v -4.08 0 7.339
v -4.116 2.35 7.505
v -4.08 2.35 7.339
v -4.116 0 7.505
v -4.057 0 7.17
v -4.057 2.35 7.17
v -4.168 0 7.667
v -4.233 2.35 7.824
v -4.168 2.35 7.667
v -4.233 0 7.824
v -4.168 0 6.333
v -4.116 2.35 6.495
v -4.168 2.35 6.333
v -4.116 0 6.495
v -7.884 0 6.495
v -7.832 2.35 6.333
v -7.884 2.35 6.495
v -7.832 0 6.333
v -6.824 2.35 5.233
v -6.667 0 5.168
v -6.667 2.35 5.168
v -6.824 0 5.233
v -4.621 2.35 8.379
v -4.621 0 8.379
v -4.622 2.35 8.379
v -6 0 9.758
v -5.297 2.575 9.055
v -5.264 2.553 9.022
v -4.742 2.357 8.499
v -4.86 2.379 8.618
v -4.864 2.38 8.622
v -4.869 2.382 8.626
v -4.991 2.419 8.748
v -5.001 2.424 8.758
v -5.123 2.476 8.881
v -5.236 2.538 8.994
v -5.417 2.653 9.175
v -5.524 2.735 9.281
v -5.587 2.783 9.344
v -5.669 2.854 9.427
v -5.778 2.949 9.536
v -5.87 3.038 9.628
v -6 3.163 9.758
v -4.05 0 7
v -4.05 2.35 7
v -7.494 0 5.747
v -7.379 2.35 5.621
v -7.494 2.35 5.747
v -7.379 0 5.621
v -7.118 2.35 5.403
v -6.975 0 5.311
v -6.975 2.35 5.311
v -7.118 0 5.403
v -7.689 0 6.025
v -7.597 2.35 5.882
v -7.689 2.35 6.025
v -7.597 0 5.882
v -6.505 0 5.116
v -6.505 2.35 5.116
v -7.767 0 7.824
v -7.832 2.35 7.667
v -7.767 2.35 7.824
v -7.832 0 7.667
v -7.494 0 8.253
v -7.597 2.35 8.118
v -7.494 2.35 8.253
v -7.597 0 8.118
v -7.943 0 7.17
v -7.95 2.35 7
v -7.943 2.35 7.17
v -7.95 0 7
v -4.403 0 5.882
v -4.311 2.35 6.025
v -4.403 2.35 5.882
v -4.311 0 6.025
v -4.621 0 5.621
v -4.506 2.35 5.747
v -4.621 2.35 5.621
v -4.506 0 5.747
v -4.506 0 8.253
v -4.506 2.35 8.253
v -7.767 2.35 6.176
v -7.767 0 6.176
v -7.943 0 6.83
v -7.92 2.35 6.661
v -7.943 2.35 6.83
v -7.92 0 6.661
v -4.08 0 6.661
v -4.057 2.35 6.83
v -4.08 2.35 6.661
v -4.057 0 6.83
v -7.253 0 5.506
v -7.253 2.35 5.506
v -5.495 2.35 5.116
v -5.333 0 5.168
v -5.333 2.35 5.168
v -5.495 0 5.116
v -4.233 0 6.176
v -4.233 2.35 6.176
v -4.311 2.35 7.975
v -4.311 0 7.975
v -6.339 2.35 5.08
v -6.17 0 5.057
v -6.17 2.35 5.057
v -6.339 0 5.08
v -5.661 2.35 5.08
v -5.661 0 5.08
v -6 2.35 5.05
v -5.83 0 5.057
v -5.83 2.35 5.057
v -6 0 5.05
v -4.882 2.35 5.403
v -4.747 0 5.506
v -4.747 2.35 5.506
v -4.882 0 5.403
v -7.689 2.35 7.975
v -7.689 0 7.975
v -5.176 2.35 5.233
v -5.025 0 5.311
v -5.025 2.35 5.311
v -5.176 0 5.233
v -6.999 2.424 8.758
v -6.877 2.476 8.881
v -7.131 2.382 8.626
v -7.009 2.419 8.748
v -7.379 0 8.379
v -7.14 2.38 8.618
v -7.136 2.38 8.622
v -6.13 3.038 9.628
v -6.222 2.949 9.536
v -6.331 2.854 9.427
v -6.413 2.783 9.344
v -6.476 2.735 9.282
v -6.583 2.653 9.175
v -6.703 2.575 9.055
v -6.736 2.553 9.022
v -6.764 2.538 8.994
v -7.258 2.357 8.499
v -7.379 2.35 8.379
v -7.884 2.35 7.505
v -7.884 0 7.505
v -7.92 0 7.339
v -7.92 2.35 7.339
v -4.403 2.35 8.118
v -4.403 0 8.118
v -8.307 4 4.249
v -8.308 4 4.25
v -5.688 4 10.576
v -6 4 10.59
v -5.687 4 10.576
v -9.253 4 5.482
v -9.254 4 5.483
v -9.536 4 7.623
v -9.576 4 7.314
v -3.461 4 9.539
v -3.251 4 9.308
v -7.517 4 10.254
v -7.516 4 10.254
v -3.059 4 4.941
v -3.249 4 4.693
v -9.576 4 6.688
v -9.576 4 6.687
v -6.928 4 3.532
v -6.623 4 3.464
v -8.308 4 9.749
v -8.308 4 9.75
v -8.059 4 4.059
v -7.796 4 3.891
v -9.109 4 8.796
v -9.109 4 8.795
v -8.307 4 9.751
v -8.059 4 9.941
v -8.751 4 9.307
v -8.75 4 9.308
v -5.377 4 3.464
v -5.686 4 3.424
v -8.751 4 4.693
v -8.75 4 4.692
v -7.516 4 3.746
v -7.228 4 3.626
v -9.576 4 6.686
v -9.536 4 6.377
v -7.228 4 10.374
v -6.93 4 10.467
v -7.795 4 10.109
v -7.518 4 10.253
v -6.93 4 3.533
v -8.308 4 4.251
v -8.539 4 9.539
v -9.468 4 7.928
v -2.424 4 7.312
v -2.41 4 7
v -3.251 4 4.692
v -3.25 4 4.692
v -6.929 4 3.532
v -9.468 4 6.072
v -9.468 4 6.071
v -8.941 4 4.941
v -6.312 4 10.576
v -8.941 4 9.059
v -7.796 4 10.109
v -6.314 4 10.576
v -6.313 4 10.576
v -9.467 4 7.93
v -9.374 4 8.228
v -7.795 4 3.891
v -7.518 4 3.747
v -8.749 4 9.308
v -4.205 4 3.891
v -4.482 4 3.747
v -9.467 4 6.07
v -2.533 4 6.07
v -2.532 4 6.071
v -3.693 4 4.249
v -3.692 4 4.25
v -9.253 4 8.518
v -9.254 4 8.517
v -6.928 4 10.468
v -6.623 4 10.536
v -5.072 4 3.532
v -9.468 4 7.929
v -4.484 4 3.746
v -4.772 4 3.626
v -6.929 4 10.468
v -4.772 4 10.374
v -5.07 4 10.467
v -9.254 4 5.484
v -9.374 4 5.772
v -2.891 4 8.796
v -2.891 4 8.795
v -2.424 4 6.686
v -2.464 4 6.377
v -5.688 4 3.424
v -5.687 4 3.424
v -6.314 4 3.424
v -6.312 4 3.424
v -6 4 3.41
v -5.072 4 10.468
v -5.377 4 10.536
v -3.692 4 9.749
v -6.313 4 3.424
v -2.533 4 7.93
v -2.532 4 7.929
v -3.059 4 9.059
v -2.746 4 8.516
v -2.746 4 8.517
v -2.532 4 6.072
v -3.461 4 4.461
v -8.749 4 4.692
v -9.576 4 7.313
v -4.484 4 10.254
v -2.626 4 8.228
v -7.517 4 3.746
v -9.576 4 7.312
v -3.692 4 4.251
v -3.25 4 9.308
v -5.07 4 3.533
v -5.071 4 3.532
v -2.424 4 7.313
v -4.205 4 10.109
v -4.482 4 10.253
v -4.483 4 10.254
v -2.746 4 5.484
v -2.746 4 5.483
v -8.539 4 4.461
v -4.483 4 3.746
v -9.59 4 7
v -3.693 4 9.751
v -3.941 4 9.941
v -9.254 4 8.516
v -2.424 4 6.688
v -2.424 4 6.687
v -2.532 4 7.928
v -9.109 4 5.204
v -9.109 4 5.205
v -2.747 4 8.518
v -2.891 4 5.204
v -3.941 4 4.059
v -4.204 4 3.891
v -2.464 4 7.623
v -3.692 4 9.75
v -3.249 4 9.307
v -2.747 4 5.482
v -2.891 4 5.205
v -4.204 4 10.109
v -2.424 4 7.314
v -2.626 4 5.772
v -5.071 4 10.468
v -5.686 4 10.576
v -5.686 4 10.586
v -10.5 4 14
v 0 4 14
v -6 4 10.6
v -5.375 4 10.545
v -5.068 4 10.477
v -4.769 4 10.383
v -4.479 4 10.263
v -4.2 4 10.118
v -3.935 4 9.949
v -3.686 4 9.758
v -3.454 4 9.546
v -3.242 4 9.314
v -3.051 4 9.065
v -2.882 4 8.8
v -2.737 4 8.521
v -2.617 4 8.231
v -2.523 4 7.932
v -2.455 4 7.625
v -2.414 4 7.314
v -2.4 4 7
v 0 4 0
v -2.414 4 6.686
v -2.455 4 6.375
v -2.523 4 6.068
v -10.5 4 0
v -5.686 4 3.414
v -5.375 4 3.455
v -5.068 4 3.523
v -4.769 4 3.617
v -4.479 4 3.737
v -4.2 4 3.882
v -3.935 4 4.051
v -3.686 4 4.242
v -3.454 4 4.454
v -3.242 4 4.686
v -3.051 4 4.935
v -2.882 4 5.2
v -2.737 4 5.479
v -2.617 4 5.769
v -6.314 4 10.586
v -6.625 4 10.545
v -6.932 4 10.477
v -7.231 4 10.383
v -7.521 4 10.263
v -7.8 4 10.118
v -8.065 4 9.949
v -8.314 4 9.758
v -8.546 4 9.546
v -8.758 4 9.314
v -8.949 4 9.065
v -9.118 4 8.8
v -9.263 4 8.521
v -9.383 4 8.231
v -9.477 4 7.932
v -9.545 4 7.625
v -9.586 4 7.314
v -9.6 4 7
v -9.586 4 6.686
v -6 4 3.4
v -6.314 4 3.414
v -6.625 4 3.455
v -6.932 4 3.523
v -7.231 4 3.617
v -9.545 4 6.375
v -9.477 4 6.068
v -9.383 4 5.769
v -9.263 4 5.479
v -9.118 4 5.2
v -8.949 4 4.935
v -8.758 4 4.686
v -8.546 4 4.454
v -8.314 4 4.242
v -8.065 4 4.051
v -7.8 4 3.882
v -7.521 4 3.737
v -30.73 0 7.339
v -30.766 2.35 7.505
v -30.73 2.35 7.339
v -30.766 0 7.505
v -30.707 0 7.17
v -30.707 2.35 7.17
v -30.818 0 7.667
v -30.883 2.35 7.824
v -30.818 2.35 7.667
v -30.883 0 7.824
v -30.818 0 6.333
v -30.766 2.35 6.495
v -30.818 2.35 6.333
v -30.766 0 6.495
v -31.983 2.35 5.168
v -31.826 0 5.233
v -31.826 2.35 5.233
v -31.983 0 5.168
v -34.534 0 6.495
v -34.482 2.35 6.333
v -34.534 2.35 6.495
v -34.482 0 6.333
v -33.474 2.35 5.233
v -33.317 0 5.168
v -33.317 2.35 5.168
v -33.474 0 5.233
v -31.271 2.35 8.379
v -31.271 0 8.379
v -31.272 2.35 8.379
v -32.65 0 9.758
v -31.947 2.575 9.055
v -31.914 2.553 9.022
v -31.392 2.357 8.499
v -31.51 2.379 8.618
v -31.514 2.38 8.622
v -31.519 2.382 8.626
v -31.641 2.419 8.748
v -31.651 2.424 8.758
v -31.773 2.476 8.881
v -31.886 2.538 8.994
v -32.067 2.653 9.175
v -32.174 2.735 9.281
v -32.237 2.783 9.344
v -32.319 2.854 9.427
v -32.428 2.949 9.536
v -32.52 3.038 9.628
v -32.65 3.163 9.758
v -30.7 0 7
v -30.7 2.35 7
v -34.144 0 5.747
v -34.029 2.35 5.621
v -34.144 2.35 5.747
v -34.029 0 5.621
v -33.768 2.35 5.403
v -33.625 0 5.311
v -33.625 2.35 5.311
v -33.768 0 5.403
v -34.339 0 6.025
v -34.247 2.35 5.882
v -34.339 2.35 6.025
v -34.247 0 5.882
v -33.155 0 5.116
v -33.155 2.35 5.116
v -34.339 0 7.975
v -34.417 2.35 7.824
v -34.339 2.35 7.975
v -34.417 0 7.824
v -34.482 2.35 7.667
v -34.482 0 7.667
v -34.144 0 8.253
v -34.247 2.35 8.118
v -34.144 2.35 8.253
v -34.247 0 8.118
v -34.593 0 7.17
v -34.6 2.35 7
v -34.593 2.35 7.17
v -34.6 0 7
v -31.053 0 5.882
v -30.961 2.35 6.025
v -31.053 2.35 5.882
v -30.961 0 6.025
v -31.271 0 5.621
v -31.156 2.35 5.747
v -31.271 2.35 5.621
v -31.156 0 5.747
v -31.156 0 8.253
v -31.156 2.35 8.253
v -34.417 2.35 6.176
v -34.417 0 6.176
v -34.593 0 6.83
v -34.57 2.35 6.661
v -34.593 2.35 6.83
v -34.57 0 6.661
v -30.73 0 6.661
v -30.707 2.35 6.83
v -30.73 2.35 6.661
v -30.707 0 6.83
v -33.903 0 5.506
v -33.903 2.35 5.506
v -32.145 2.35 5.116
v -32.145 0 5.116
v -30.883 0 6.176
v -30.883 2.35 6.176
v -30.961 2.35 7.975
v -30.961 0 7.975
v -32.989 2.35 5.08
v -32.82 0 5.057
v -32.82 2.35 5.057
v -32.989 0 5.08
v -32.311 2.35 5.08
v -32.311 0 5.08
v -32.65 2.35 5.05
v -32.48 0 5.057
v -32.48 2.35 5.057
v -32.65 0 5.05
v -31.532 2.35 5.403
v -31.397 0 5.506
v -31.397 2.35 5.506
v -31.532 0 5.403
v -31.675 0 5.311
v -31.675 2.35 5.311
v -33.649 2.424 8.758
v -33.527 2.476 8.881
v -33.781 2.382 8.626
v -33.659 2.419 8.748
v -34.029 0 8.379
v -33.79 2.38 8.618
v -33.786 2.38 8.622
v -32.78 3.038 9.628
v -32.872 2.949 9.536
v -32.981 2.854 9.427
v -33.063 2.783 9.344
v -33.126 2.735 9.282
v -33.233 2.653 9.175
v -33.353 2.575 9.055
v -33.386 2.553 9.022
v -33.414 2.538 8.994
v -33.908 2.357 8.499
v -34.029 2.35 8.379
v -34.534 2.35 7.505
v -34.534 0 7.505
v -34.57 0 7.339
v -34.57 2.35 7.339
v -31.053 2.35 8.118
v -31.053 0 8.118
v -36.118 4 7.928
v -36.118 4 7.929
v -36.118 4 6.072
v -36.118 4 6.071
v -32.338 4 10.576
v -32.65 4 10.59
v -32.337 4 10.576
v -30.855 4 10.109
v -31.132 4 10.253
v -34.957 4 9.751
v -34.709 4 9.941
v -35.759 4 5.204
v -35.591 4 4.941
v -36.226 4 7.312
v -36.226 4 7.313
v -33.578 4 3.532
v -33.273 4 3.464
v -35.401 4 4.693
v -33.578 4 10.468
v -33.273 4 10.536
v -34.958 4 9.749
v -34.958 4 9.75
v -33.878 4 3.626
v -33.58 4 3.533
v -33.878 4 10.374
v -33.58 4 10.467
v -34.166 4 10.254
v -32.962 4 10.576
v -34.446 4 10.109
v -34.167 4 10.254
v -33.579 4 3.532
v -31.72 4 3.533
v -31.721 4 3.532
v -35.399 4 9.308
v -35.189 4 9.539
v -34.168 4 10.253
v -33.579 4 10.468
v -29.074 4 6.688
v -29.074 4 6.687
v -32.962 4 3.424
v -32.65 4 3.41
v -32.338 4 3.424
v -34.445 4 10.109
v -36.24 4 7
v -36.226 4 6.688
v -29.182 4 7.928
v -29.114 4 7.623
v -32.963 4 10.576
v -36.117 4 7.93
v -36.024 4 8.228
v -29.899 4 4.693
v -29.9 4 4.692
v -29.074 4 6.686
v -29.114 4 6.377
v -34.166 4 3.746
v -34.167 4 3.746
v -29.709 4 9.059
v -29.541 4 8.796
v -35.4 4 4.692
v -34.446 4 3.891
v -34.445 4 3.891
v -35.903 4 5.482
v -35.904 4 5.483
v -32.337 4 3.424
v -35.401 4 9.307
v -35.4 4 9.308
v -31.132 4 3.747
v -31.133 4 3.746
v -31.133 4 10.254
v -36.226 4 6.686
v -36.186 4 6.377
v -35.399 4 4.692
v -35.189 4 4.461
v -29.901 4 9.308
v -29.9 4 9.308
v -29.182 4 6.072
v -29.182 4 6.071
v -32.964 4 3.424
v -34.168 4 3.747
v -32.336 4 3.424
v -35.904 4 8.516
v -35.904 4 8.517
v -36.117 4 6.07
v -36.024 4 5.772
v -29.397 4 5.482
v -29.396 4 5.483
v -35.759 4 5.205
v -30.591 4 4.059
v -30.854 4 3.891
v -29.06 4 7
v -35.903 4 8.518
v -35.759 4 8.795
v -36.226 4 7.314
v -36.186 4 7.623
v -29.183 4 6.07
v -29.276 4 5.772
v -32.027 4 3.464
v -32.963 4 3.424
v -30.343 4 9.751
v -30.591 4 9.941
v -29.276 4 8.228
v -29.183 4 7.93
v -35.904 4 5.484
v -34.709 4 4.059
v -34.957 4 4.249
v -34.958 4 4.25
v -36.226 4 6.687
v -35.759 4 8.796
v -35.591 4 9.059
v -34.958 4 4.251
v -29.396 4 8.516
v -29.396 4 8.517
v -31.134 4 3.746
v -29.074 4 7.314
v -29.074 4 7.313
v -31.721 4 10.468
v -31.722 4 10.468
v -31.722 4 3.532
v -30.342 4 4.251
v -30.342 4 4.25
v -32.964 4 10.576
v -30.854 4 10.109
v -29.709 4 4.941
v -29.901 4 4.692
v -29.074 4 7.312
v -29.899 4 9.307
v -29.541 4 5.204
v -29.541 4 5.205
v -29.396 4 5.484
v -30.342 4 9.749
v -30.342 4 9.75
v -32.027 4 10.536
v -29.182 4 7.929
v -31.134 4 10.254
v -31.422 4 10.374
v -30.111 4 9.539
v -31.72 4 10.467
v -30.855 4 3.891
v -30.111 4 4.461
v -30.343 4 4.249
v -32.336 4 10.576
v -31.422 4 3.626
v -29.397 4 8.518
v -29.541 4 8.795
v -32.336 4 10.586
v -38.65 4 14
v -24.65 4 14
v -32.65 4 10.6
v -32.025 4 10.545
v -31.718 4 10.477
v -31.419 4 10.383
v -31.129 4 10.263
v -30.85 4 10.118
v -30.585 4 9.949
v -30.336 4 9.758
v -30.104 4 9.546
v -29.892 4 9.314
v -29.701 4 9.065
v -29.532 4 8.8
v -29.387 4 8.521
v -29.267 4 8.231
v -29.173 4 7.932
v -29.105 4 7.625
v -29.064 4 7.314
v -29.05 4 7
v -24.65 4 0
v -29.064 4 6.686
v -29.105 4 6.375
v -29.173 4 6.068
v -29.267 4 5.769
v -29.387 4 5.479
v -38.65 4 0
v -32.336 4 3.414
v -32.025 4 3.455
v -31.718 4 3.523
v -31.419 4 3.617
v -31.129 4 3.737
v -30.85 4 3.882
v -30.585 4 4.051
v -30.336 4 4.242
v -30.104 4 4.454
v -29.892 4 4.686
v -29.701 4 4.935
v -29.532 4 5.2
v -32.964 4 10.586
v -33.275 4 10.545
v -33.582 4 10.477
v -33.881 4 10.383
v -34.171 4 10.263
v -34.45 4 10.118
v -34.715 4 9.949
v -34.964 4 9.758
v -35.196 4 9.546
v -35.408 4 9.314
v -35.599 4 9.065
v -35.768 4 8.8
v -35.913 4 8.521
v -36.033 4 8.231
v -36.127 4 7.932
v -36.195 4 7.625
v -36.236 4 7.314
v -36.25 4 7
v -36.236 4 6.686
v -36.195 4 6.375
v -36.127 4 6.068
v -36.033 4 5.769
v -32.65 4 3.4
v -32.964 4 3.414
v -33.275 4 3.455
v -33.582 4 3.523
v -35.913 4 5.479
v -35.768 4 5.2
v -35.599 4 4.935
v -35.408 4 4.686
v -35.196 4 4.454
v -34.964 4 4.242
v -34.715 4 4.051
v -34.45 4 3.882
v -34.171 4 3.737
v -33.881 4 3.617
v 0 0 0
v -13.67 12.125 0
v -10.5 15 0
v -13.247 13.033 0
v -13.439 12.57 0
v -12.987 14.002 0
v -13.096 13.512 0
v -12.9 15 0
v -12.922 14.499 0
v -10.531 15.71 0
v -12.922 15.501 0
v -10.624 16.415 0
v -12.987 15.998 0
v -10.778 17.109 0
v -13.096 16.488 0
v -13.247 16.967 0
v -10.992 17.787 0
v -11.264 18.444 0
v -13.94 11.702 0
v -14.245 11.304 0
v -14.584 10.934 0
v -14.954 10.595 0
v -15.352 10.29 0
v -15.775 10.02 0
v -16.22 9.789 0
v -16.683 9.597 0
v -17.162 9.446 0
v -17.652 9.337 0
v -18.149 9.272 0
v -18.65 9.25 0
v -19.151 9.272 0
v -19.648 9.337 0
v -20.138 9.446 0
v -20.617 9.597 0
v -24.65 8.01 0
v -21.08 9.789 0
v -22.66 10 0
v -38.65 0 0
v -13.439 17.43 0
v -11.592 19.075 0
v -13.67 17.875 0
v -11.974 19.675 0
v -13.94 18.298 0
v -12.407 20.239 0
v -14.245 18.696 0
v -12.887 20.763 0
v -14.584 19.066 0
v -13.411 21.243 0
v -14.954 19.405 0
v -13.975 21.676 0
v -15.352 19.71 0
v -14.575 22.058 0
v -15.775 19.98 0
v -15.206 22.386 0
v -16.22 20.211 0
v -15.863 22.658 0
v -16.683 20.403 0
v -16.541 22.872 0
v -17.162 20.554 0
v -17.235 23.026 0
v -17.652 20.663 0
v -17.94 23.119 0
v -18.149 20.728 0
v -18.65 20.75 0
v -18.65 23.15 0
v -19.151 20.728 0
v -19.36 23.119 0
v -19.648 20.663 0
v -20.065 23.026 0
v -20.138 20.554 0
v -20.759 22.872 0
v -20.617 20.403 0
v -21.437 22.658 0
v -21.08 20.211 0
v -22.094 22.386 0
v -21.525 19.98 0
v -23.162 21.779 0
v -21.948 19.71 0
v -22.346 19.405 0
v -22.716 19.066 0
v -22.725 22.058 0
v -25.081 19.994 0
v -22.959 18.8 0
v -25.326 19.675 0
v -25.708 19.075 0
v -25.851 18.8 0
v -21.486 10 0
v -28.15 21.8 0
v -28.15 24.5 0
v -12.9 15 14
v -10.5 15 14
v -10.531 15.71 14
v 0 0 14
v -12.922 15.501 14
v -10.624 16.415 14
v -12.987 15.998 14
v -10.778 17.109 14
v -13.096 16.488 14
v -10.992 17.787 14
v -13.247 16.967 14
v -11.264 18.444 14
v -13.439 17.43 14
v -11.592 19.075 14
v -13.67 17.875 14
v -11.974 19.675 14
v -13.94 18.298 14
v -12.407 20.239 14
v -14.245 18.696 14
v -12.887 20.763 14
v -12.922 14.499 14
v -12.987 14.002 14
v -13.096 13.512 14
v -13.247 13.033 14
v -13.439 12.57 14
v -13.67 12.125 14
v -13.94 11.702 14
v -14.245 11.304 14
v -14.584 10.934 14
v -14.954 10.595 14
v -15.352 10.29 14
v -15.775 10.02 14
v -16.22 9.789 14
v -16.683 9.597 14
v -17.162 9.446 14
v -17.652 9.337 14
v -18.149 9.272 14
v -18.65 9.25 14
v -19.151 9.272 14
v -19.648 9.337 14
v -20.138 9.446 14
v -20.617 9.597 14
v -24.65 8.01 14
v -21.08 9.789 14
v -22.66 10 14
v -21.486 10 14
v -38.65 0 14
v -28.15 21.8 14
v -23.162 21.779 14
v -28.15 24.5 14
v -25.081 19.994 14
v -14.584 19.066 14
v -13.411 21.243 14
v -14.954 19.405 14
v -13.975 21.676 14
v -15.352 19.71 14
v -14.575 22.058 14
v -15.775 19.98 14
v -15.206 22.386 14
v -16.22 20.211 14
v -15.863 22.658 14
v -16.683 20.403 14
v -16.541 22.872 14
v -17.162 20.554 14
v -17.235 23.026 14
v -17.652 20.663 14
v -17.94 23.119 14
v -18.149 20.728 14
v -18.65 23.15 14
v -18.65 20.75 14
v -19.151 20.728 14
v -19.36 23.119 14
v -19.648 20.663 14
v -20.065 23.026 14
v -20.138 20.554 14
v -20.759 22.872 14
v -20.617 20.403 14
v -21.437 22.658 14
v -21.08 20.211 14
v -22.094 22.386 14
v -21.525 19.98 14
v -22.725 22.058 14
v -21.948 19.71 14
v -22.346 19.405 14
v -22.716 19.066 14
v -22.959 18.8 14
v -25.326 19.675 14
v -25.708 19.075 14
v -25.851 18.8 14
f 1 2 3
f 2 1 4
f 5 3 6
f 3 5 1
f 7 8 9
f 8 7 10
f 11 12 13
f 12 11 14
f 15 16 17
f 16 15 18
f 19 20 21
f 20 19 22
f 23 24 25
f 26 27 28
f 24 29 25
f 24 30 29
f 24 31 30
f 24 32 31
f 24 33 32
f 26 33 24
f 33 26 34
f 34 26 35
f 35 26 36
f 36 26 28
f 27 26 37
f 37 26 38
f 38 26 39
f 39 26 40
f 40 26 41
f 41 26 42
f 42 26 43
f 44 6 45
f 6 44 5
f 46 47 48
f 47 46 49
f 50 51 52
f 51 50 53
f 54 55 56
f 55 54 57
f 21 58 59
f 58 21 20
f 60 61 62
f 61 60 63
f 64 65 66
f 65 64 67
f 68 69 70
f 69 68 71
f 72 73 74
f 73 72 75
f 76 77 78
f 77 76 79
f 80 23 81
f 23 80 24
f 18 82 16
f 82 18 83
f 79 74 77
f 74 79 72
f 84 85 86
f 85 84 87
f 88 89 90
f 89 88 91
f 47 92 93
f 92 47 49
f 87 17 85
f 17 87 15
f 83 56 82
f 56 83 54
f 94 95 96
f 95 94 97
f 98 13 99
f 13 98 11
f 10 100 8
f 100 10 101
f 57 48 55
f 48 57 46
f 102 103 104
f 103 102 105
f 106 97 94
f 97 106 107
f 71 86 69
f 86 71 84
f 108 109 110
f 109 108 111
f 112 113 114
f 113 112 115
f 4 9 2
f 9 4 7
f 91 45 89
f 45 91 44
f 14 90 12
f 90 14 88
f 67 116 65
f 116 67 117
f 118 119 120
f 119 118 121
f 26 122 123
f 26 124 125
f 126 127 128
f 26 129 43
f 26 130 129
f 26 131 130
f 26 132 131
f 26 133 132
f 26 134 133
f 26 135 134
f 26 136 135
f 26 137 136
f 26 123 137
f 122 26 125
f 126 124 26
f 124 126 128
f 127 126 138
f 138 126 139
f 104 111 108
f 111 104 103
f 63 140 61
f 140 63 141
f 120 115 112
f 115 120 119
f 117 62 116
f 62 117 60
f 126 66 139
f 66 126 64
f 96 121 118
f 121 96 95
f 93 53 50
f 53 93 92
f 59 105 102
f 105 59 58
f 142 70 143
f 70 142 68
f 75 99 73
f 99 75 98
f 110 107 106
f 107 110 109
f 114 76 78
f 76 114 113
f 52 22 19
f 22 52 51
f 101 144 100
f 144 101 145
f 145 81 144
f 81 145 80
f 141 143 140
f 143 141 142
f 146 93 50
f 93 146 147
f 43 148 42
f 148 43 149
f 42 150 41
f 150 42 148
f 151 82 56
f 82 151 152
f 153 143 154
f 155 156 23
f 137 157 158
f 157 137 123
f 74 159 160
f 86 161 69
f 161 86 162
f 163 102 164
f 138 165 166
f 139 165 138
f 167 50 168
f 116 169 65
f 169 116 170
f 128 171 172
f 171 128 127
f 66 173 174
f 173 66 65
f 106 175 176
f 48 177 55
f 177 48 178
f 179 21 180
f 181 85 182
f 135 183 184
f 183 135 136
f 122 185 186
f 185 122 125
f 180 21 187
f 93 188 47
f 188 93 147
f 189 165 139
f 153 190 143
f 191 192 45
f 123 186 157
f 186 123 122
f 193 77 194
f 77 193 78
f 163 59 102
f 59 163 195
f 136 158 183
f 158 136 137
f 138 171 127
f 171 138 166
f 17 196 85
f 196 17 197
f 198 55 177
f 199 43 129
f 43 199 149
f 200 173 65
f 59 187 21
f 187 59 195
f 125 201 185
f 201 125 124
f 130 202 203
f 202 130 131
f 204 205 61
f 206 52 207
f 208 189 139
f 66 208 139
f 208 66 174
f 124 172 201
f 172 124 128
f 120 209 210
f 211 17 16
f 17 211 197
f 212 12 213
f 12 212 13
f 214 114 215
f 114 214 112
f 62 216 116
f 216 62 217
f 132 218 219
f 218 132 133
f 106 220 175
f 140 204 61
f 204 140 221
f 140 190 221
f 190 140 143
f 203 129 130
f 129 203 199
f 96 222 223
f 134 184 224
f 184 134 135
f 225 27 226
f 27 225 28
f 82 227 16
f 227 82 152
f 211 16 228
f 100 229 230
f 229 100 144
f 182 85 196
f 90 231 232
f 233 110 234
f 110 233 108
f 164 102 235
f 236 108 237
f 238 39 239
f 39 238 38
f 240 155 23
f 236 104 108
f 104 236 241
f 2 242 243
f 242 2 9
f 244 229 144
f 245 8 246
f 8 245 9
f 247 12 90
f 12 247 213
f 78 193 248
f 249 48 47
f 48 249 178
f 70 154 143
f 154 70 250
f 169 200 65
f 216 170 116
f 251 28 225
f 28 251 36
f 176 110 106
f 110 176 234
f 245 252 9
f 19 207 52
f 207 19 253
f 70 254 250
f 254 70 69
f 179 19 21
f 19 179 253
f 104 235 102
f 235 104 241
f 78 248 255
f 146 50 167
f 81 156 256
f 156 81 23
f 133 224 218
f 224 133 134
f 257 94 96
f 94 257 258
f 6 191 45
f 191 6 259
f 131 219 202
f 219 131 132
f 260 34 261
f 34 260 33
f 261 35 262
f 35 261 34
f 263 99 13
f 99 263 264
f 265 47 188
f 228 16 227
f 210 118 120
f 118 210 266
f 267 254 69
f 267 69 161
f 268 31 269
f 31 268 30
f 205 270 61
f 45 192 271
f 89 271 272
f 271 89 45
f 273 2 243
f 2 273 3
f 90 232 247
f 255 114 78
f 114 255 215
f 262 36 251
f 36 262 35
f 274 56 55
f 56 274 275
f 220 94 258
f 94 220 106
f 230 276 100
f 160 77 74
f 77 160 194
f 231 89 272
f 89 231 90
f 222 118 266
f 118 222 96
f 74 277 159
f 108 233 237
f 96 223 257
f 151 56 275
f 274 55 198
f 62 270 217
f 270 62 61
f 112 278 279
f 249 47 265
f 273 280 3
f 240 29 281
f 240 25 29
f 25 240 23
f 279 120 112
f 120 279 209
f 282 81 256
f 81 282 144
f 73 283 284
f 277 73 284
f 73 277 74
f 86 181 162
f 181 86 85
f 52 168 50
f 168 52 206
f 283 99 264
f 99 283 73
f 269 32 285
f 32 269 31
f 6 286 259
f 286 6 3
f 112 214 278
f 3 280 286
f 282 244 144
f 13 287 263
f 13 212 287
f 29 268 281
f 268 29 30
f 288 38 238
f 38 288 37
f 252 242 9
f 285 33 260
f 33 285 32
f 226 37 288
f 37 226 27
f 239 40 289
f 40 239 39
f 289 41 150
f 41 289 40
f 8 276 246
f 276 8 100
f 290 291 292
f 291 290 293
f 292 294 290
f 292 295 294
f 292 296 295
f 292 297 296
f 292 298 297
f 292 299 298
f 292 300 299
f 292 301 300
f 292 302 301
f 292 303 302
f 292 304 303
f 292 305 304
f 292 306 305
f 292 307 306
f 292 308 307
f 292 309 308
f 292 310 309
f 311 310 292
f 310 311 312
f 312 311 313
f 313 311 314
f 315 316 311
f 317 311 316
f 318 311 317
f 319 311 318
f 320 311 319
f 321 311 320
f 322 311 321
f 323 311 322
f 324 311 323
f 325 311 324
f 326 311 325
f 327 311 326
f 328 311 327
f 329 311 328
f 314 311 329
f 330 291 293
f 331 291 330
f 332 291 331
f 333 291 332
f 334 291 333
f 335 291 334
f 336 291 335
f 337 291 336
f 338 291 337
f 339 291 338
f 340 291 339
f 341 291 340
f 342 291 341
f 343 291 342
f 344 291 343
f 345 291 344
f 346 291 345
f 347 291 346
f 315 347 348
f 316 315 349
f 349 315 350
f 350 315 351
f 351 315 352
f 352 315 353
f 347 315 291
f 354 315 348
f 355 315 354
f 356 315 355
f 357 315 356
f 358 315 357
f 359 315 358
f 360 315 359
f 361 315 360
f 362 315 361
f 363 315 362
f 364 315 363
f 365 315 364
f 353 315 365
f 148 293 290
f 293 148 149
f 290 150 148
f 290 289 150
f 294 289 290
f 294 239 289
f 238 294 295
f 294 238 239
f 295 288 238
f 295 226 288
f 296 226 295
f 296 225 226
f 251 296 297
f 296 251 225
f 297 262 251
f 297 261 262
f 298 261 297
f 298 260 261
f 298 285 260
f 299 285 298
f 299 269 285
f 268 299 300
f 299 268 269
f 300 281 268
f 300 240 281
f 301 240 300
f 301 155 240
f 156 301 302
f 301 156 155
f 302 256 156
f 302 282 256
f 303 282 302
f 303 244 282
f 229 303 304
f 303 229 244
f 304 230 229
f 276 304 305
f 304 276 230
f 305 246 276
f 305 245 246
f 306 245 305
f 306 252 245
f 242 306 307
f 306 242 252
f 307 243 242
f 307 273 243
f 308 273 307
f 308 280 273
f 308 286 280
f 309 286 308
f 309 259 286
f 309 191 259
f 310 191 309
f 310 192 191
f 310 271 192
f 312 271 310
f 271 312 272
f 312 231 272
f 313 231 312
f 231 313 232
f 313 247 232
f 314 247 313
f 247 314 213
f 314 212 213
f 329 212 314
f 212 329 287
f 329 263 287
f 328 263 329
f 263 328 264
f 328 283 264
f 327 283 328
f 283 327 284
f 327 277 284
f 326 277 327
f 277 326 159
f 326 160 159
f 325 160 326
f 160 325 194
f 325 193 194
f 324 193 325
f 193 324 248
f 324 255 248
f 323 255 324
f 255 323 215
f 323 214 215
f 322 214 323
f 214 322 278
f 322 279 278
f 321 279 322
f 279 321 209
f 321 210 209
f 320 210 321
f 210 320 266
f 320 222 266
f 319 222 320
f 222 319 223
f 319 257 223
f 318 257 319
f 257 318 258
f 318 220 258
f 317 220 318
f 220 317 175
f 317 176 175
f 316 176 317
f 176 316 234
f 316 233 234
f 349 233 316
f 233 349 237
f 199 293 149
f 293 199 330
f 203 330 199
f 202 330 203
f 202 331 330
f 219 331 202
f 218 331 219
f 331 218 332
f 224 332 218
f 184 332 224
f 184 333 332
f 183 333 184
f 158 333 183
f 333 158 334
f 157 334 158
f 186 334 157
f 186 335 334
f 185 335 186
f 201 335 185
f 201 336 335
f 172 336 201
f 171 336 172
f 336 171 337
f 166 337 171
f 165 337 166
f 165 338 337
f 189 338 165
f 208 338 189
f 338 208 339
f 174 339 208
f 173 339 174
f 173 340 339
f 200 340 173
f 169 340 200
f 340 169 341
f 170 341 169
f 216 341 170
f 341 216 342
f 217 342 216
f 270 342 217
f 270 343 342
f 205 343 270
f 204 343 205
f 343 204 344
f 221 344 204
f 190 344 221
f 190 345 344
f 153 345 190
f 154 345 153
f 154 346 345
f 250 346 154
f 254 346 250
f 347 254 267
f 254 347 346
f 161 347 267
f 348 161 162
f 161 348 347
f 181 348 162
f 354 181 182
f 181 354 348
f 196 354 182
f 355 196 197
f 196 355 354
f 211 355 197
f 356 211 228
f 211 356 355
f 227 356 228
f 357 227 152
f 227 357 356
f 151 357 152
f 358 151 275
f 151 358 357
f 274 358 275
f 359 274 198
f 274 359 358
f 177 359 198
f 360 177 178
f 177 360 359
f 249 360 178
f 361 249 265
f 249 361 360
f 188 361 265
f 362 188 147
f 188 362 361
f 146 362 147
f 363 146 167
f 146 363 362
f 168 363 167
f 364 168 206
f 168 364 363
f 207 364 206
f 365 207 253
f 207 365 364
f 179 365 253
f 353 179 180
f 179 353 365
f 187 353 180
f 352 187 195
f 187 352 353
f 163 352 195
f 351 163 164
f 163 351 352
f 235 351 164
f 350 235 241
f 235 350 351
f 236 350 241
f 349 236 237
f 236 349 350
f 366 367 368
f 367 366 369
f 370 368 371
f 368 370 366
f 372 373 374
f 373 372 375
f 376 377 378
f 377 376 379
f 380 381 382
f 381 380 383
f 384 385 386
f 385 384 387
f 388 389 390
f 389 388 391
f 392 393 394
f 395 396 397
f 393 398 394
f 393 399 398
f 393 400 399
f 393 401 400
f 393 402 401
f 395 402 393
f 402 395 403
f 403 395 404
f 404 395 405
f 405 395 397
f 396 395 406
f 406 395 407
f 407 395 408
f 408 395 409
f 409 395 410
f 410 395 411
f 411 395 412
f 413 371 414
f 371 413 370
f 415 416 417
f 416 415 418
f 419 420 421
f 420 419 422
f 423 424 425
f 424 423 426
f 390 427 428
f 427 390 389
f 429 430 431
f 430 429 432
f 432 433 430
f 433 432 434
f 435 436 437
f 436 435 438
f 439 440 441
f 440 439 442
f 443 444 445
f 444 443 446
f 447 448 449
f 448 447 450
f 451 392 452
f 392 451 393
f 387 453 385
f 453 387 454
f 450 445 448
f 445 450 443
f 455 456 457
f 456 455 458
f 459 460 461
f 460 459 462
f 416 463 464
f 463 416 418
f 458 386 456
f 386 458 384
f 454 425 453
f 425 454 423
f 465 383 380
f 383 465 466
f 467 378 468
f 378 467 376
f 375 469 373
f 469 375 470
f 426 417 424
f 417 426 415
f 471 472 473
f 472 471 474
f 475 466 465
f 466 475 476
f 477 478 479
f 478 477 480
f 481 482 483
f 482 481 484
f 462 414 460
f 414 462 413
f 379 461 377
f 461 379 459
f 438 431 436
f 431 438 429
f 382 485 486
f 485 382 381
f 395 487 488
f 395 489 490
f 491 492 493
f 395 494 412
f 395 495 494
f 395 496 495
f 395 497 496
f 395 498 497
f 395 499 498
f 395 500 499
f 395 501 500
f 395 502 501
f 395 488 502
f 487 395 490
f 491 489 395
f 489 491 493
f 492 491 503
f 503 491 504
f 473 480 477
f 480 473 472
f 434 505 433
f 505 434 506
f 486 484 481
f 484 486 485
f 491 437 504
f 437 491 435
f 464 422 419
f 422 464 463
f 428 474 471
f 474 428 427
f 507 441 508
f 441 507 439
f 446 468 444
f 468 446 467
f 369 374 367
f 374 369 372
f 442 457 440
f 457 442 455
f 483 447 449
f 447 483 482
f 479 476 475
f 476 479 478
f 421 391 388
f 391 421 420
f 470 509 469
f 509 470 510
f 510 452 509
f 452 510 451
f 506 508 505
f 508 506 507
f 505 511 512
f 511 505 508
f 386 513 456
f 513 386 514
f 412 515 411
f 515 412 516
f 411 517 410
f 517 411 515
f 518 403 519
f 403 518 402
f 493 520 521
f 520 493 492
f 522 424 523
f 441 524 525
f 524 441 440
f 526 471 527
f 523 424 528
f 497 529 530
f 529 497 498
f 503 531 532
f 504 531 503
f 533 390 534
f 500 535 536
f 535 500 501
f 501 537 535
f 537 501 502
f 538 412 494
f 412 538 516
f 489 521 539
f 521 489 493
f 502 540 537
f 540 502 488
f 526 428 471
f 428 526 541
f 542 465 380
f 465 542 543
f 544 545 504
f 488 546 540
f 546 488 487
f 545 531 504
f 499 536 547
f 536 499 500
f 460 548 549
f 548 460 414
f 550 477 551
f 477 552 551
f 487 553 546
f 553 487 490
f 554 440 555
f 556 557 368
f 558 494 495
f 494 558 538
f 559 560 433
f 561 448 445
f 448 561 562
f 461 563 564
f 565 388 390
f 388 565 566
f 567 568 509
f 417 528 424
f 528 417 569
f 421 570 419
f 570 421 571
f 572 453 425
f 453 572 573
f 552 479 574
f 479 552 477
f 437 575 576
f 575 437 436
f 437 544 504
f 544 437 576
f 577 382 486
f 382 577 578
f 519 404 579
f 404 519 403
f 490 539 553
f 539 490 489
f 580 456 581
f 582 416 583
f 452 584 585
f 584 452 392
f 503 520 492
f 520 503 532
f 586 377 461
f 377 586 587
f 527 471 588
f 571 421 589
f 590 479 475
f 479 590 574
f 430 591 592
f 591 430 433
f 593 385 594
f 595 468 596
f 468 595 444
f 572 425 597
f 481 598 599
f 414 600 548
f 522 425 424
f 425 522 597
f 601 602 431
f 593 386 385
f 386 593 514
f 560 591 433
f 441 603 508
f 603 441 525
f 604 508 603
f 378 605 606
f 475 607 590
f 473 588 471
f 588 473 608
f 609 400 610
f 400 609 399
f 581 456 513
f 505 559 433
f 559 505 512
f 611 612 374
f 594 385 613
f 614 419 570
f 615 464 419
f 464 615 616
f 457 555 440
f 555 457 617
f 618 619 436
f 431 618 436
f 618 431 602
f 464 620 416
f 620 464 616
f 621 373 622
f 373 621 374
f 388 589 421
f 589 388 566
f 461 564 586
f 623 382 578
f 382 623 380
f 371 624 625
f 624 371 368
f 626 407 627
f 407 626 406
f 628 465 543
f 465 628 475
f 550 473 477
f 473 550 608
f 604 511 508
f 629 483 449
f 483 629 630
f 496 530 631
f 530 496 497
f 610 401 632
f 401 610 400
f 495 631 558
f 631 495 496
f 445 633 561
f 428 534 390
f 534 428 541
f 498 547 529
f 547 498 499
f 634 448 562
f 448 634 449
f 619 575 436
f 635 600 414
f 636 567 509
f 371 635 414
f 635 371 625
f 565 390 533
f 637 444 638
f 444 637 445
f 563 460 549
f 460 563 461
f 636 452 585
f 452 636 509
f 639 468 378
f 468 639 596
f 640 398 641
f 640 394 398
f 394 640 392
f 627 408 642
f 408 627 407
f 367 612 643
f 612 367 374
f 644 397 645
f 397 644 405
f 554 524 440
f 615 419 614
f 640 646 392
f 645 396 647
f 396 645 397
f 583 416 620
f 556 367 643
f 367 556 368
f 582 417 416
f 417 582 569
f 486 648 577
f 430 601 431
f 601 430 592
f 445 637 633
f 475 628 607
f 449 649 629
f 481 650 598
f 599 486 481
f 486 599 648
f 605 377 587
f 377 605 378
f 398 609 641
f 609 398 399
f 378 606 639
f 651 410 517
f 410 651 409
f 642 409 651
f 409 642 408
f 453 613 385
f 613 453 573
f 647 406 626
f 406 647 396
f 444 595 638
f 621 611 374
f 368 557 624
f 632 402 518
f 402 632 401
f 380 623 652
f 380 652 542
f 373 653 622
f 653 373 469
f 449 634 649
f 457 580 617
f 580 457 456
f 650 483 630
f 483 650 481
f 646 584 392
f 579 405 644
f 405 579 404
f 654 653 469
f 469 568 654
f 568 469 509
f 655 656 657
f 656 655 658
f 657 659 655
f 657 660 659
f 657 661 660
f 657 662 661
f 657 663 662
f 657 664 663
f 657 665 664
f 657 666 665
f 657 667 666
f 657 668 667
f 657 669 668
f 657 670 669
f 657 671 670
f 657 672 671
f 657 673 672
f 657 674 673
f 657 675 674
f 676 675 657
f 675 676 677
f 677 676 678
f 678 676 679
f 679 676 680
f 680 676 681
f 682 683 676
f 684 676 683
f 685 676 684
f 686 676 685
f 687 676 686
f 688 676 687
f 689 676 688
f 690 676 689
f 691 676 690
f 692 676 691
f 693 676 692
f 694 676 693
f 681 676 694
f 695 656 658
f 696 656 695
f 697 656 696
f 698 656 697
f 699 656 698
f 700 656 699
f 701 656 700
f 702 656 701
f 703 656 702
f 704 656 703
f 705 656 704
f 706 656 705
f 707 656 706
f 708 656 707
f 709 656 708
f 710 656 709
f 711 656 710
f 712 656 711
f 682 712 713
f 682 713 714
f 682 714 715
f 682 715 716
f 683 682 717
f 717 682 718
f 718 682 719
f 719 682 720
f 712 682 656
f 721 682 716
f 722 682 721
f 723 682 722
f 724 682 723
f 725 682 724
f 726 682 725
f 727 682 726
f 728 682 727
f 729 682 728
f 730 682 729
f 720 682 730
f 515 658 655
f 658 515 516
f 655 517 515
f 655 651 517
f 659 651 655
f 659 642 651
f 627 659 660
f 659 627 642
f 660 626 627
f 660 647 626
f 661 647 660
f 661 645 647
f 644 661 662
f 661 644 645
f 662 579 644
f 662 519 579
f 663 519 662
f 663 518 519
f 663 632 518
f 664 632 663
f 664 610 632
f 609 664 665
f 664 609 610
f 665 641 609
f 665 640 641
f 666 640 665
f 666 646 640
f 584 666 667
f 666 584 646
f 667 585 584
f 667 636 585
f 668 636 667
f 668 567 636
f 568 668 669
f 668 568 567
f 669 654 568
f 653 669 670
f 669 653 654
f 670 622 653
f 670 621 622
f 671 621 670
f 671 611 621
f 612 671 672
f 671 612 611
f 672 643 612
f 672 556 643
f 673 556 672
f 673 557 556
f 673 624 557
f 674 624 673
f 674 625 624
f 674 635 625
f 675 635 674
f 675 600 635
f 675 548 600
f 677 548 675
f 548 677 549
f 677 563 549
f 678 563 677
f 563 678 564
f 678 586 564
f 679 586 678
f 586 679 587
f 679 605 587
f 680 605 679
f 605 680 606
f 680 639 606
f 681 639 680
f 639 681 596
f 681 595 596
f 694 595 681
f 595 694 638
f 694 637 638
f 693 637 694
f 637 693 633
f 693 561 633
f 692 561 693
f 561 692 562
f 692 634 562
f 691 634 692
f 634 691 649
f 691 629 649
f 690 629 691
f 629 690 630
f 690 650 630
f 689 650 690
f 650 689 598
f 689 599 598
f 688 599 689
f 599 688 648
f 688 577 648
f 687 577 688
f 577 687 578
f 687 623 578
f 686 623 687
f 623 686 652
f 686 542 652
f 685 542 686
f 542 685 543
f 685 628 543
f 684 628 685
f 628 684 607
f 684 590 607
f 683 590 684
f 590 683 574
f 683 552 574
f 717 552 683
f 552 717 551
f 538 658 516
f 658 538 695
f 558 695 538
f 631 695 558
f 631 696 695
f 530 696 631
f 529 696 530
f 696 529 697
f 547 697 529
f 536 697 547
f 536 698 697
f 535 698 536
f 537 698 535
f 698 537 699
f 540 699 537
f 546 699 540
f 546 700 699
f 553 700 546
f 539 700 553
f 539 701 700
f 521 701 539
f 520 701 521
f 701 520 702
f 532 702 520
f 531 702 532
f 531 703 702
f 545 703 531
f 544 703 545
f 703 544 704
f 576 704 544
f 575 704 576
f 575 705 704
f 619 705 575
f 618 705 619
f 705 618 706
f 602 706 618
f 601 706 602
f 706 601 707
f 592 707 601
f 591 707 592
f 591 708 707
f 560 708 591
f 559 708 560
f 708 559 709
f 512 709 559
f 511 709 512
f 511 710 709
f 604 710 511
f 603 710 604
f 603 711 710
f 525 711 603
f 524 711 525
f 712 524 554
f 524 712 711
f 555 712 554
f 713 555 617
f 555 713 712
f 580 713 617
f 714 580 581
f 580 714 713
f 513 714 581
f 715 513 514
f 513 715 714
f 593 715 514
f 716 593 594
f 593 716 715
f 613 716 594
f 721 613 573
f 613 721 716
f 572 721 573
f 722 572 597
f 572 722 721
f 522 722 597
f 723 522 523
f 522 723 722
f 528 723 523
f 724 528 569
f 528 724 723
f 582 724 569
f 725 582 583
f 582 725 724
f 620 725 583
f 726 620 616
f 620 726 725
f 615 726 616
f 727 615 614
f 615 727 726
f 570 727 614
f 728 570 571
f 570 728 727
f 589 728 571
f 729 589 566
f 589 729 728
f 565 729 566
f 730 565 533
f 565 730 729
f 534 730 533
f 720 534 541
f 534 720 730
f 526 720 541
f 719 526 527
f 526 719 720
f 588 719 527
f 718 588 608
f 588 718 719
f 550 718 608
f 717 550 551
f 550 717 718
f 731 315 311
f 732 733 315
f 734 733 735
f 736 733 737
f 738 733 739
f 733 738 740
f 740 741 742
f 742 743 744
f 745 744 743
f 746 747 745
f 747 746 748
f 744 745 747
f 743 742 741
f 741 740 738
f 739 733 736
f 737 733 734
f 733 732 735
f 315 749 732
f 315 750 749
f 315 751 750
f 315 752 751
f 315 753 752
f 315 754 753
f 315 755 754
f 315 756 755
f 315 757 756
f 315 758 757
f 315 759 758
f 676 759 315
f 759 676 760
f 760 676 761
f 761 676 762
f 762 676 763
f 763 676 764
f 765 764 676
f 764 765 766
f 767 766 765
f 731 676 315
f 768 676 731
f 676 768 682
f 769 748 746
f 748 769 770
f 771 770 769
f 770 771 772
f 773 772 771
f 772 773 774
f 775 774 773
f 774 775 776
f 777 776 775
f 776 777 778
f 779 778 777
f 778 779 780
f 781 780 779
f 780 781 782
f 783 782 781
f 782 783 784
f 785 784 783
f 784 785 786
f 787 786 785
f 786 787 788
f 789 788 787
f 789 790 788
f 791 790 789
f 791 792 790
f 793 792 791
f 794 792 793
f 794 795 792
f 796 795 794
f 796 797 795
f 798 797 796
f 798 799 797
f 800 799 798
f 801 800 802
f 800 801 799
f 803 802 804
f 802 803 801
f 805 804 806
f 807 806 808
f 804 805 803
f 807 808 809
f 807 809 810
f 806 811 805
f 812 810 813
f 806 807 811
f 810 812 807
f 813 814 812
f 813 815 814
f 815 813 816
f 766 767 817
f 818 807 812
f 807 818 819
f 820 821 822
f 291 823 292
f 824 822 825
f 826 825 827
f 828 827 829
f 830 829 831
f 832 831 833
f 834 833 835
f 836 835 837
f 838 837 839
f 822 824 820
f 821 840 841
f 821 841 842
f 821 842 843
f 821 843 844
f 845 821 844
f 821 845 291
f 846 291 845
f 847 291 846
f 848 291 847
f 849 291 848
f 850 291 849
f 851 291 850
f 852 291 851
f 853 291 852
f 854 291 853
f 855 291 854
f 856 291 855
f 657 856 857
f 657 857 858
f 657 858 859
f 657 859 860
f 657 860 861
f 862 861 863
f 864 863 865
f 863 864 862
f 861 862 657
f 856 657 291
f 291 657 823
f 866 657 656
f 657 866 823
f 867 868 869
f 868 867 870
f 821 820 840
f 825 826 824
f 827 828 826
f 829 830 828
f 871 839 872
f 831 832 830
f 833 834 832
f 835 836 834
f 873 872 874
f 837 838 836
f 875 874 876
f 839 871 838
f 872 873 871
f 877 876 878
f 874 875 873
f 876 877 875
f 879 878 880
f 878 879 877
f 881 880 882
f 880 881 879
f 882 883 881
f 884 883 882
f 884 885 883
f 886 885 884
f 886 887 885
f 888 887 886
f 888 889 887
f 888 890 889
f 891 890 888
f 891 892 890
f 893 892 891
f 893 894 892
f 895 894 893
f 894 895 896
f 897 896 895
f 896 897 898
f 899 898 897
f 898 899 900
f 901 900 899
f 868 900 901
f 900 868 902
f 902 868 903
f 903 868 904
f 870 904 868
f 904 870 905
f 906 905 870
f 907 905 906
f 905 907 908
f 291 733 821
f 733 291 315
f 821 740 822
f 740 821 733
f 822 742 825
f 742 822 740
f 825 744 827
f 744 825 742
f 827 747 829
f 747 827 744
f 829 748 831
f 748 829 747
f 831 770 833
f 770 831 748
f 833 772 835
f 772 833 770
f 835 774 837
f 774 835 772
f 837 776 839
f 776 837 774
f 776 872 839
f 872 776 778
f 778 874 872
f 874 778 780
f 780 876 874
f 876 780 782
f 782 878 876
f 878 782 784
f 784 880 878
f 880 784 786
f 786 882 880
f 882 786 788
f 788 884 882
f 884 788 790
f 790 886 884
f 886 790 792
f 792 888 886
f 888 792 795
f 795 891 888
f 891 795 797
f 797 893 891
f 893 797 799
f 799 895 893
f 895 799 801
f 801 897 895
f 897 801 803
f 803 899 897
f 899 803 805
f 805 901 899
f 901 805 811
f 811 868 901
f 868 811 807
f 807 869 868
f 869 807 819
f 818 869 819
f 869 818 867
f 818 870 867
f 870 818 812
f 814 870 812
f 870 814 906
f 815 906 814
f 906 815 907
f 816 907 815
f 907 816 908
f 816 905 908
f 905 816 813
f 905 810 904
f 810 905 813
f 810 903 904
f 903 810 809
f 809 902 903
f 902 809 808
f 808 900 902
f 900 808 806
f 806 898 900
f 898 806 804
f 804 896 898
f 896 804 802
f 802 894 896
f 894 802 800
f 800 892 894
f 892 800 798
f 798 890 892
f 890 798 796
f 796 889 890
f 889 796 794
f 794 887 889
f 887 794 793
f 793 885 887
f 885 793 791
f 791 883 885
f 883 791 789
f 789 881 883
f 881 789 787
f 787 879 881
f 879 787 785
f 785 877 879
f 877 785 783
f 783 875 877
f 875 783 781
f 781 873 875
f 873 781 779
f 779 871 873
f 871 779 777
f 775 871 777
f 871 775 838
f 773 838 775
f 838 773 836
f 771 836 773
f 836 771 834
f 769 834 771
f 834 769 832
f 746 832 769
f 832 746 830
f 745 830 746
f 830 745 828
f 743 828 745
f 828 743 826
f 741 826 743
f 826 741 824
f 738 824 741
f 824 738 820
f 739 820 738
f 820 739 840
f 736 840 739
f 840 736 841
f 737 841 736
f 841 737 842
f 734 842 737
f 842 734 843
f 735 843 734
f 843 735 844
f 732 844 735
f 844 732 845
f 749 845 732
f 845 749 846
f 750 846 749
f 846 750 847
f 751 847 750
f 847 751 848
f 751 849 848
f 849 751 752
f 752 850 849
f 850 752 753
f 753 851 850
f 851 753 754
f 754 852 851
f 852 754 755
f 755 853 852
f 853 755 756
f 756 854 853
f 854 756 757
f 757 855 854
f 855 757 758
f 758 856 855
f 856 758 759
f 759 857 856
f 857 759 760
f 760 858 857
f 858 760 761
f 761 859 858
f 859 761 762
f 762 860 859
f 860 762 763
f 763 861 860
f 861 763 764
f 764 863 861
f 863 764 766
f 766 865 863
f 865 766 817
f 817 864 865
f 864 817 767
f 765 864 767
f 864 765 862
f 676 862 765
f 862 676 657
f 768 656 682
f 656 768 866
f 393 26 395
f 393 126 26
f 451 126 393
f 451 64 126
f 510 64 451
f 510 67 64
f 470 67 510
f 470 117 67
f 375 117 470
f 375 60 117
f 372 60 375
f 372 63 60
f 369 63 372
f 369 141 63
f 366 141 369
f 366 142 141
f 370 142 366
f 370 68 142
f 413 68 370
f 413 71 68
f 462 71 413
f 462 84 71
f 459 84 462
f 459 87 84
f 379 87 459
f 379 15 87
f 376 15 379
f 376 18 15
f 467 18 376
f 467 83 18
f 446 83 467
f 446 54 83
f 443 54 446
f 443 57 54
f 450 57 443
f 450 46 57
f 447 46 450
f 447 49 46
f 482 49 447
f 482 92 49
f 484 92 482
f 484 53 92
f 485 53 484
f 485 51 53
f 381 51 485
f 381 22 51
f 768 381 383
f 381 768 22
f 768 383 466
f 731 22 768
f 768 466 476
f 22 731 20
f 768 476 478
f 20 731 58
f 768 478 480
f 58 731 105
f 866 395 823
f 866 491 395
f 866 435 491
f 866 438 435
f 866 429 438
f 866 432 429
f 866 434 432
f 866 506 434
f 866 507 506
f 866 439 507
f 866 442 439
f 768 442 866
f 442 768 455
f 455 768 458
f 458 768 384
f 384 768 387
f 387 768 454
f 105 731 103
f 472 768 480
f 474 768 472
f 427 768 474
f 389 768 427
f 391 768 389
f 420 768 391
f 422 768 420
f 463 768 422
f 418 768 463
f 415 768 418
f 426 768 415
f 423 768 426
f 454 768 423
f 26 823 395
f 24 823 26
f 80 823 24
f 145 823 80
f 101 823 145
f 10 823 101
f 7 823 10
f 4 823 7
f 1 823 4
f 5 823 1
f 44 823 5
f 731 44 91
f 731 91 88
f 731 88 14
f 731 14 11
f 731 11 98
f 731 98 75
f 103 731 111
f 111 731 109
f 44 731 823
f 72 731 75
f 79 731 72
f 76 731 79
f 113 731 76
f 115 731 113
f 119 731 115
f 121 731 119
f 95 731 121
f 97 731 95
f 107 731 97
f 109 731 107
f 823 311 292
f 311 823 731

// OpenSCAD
// Curtain-rod hook v4 - SPRING TAB WITH THUMB RELEASE (screw or VHB mount)
// The back of the mouth is rigid; the front of the cup is one long spring tab (the ring's front
// half, tied to the base only at the bottom). Push the rod down: the leaning thumb fin funnels
// it, the tab springs 1.2 mm forward and clicks back. To remove, pull the fin forward and lift.
// Units mm. In-use coordinates: X = along the rod, Y = out from the frame, Z = up.
// PART = "print"    -> one hook laid flat, ready for STL export (print 2)
//        "assembly" -> in-use orientation with a short piece of rod (for viewing only)

/* [What to show] */
PART = "print";        // ["print", "assembly"]
MOUNT = "screw";       // ["screw", "vhb"]

/* [Rod] */
ROD_D = 10;
ROD_CLEAR = 1.5;
ROD_OFFSET = 15;
SNAP = 1.2;            // mouth narrower than the rod (all taken by the front tab)
BACK_LIP = 0.75;       // rigid back edge overlaps the bore by this much

/* [Body] */
WIDTH = 14;
BASE_T = 4;
WALL = 2.4;
BAR_T = 3;
FIN_T = 2.4;           // thumb fin
FIN_TOP = 9.5;         // fin top above the rod axis
FIN_LEAN = 3;          // forward lean of the fin

/* [Mount] */
SCREW_HOLE = 3.9;
CSK_D = 7.2;
SCREW_EDGE = 6;
ACCESS = 4.5;
PLATE_W = 20;

$fn = 72;
R_IN = (ROD_D + ROD_CLEAR) / 2;
R_OUT = R_IN + WALL;
D = ROD_OFFSET;
ZC = SCREW_EDGE + ACCESS + R_OUT;
Y_B = D - R_IN + BACK_LIP;
Y_N = Y_B + ROD_D - SNAP;
Z_BACK = ZC + 6;
Z_SCREWS = [SCREW_EDGE, ZC + FIN_TOP + ACCESS];
HEIGHT = Z_SCREWS[1] + SCREW_EDGE;
Z_TIP = ZC + 4.4;

module rect(y0, y1, z0, z1) translate([y0, z0]) square([y1 - y0, z1 - z0]);
module inuse(w, x0 = 0) translate([x0, 0, 0]) rotate([90, 0, 90]) linear_extrude(w, convexity = 8) children();
module tear2d(r) { circle(r); translate([r * 0.7071, 0]) rotate(45) square(r, center = true); }
module csk_hole(x, z) {
    r = SCREW_HOLE / 2; h = (CSK_D - SCREW_HOLE) / 2;
    translate([x, 0, z]) {
        translate([0, 50, 0]) rotate([90, 0, 0]) linear_extrude(100, convexity = 4) tear2d(r);
        translate([0, BASE_T - h, 0]) rotate([-90, 0, 0]) cylinder(h = h + 0.01, r1 = r, r2 = CSK_D / 2);
        translate([0, BASE_T, 0]) rotate([-90, 0, 0]) cylinder(h = 1, r = CSK_D / 2);
    }
}

module profile() difference() {
    union() {
        rect(0, BASE_T, 0, HEIGHT);
        rect(0, D, ZC - R_OUT, ZC - R_OUT + BAR_T);
        rect(0, Y_B, ZC - R_OUT, Z_BACK);
        translate([D, ZC]) circle(R_OUT);
        polygon([[Y_N, Z_TIP], [Y_N + FIN_T + 0.3, Z_TIP - 0.4],
                 [Y_N + FIN_T + 0.3 + FIN_LEAN, ZC + FIN_TOP], [Y_N + FIN_LEAN, ZC + FIN_TOP]]);
    }
    translate([D, ZC]) circle(R_IN);
    rect(Y_B, Y_N, ZC, ZC + FIN_TOP + 1);
    rect(BASE_T, Y_B + 0.01, Z_BACK, ZC + R_OUT + 1);
    polygon([[Y_B - 2, Z_BACK + 0.01], [Y_B + 0.01, Z_BACK + 0.01], [Y_B + 0.01, Z_BACK - 2]]);
}

module hook() difference() {
    union() {
        inuse(WIDTH) profile();
        if (MOUNT == "vhb") cube([PLATE_W, BASE_T, HEIGHT]);
    }
    if (MOUNT == "screw") for (z = Z_SCREWS) csk_hole(WIDTH / 2, z);
}

module rod() color("Gainsboro") translate([-25, D, ZC - ROD_CLEAR / 2]) rotate([0, 90, 0]) cylinder(d = ROD_D, h = 25);

if (PART == "print") rotate([0, -90, 0]) hook();
else { color("SteelBlue") hook(); rod(); }
